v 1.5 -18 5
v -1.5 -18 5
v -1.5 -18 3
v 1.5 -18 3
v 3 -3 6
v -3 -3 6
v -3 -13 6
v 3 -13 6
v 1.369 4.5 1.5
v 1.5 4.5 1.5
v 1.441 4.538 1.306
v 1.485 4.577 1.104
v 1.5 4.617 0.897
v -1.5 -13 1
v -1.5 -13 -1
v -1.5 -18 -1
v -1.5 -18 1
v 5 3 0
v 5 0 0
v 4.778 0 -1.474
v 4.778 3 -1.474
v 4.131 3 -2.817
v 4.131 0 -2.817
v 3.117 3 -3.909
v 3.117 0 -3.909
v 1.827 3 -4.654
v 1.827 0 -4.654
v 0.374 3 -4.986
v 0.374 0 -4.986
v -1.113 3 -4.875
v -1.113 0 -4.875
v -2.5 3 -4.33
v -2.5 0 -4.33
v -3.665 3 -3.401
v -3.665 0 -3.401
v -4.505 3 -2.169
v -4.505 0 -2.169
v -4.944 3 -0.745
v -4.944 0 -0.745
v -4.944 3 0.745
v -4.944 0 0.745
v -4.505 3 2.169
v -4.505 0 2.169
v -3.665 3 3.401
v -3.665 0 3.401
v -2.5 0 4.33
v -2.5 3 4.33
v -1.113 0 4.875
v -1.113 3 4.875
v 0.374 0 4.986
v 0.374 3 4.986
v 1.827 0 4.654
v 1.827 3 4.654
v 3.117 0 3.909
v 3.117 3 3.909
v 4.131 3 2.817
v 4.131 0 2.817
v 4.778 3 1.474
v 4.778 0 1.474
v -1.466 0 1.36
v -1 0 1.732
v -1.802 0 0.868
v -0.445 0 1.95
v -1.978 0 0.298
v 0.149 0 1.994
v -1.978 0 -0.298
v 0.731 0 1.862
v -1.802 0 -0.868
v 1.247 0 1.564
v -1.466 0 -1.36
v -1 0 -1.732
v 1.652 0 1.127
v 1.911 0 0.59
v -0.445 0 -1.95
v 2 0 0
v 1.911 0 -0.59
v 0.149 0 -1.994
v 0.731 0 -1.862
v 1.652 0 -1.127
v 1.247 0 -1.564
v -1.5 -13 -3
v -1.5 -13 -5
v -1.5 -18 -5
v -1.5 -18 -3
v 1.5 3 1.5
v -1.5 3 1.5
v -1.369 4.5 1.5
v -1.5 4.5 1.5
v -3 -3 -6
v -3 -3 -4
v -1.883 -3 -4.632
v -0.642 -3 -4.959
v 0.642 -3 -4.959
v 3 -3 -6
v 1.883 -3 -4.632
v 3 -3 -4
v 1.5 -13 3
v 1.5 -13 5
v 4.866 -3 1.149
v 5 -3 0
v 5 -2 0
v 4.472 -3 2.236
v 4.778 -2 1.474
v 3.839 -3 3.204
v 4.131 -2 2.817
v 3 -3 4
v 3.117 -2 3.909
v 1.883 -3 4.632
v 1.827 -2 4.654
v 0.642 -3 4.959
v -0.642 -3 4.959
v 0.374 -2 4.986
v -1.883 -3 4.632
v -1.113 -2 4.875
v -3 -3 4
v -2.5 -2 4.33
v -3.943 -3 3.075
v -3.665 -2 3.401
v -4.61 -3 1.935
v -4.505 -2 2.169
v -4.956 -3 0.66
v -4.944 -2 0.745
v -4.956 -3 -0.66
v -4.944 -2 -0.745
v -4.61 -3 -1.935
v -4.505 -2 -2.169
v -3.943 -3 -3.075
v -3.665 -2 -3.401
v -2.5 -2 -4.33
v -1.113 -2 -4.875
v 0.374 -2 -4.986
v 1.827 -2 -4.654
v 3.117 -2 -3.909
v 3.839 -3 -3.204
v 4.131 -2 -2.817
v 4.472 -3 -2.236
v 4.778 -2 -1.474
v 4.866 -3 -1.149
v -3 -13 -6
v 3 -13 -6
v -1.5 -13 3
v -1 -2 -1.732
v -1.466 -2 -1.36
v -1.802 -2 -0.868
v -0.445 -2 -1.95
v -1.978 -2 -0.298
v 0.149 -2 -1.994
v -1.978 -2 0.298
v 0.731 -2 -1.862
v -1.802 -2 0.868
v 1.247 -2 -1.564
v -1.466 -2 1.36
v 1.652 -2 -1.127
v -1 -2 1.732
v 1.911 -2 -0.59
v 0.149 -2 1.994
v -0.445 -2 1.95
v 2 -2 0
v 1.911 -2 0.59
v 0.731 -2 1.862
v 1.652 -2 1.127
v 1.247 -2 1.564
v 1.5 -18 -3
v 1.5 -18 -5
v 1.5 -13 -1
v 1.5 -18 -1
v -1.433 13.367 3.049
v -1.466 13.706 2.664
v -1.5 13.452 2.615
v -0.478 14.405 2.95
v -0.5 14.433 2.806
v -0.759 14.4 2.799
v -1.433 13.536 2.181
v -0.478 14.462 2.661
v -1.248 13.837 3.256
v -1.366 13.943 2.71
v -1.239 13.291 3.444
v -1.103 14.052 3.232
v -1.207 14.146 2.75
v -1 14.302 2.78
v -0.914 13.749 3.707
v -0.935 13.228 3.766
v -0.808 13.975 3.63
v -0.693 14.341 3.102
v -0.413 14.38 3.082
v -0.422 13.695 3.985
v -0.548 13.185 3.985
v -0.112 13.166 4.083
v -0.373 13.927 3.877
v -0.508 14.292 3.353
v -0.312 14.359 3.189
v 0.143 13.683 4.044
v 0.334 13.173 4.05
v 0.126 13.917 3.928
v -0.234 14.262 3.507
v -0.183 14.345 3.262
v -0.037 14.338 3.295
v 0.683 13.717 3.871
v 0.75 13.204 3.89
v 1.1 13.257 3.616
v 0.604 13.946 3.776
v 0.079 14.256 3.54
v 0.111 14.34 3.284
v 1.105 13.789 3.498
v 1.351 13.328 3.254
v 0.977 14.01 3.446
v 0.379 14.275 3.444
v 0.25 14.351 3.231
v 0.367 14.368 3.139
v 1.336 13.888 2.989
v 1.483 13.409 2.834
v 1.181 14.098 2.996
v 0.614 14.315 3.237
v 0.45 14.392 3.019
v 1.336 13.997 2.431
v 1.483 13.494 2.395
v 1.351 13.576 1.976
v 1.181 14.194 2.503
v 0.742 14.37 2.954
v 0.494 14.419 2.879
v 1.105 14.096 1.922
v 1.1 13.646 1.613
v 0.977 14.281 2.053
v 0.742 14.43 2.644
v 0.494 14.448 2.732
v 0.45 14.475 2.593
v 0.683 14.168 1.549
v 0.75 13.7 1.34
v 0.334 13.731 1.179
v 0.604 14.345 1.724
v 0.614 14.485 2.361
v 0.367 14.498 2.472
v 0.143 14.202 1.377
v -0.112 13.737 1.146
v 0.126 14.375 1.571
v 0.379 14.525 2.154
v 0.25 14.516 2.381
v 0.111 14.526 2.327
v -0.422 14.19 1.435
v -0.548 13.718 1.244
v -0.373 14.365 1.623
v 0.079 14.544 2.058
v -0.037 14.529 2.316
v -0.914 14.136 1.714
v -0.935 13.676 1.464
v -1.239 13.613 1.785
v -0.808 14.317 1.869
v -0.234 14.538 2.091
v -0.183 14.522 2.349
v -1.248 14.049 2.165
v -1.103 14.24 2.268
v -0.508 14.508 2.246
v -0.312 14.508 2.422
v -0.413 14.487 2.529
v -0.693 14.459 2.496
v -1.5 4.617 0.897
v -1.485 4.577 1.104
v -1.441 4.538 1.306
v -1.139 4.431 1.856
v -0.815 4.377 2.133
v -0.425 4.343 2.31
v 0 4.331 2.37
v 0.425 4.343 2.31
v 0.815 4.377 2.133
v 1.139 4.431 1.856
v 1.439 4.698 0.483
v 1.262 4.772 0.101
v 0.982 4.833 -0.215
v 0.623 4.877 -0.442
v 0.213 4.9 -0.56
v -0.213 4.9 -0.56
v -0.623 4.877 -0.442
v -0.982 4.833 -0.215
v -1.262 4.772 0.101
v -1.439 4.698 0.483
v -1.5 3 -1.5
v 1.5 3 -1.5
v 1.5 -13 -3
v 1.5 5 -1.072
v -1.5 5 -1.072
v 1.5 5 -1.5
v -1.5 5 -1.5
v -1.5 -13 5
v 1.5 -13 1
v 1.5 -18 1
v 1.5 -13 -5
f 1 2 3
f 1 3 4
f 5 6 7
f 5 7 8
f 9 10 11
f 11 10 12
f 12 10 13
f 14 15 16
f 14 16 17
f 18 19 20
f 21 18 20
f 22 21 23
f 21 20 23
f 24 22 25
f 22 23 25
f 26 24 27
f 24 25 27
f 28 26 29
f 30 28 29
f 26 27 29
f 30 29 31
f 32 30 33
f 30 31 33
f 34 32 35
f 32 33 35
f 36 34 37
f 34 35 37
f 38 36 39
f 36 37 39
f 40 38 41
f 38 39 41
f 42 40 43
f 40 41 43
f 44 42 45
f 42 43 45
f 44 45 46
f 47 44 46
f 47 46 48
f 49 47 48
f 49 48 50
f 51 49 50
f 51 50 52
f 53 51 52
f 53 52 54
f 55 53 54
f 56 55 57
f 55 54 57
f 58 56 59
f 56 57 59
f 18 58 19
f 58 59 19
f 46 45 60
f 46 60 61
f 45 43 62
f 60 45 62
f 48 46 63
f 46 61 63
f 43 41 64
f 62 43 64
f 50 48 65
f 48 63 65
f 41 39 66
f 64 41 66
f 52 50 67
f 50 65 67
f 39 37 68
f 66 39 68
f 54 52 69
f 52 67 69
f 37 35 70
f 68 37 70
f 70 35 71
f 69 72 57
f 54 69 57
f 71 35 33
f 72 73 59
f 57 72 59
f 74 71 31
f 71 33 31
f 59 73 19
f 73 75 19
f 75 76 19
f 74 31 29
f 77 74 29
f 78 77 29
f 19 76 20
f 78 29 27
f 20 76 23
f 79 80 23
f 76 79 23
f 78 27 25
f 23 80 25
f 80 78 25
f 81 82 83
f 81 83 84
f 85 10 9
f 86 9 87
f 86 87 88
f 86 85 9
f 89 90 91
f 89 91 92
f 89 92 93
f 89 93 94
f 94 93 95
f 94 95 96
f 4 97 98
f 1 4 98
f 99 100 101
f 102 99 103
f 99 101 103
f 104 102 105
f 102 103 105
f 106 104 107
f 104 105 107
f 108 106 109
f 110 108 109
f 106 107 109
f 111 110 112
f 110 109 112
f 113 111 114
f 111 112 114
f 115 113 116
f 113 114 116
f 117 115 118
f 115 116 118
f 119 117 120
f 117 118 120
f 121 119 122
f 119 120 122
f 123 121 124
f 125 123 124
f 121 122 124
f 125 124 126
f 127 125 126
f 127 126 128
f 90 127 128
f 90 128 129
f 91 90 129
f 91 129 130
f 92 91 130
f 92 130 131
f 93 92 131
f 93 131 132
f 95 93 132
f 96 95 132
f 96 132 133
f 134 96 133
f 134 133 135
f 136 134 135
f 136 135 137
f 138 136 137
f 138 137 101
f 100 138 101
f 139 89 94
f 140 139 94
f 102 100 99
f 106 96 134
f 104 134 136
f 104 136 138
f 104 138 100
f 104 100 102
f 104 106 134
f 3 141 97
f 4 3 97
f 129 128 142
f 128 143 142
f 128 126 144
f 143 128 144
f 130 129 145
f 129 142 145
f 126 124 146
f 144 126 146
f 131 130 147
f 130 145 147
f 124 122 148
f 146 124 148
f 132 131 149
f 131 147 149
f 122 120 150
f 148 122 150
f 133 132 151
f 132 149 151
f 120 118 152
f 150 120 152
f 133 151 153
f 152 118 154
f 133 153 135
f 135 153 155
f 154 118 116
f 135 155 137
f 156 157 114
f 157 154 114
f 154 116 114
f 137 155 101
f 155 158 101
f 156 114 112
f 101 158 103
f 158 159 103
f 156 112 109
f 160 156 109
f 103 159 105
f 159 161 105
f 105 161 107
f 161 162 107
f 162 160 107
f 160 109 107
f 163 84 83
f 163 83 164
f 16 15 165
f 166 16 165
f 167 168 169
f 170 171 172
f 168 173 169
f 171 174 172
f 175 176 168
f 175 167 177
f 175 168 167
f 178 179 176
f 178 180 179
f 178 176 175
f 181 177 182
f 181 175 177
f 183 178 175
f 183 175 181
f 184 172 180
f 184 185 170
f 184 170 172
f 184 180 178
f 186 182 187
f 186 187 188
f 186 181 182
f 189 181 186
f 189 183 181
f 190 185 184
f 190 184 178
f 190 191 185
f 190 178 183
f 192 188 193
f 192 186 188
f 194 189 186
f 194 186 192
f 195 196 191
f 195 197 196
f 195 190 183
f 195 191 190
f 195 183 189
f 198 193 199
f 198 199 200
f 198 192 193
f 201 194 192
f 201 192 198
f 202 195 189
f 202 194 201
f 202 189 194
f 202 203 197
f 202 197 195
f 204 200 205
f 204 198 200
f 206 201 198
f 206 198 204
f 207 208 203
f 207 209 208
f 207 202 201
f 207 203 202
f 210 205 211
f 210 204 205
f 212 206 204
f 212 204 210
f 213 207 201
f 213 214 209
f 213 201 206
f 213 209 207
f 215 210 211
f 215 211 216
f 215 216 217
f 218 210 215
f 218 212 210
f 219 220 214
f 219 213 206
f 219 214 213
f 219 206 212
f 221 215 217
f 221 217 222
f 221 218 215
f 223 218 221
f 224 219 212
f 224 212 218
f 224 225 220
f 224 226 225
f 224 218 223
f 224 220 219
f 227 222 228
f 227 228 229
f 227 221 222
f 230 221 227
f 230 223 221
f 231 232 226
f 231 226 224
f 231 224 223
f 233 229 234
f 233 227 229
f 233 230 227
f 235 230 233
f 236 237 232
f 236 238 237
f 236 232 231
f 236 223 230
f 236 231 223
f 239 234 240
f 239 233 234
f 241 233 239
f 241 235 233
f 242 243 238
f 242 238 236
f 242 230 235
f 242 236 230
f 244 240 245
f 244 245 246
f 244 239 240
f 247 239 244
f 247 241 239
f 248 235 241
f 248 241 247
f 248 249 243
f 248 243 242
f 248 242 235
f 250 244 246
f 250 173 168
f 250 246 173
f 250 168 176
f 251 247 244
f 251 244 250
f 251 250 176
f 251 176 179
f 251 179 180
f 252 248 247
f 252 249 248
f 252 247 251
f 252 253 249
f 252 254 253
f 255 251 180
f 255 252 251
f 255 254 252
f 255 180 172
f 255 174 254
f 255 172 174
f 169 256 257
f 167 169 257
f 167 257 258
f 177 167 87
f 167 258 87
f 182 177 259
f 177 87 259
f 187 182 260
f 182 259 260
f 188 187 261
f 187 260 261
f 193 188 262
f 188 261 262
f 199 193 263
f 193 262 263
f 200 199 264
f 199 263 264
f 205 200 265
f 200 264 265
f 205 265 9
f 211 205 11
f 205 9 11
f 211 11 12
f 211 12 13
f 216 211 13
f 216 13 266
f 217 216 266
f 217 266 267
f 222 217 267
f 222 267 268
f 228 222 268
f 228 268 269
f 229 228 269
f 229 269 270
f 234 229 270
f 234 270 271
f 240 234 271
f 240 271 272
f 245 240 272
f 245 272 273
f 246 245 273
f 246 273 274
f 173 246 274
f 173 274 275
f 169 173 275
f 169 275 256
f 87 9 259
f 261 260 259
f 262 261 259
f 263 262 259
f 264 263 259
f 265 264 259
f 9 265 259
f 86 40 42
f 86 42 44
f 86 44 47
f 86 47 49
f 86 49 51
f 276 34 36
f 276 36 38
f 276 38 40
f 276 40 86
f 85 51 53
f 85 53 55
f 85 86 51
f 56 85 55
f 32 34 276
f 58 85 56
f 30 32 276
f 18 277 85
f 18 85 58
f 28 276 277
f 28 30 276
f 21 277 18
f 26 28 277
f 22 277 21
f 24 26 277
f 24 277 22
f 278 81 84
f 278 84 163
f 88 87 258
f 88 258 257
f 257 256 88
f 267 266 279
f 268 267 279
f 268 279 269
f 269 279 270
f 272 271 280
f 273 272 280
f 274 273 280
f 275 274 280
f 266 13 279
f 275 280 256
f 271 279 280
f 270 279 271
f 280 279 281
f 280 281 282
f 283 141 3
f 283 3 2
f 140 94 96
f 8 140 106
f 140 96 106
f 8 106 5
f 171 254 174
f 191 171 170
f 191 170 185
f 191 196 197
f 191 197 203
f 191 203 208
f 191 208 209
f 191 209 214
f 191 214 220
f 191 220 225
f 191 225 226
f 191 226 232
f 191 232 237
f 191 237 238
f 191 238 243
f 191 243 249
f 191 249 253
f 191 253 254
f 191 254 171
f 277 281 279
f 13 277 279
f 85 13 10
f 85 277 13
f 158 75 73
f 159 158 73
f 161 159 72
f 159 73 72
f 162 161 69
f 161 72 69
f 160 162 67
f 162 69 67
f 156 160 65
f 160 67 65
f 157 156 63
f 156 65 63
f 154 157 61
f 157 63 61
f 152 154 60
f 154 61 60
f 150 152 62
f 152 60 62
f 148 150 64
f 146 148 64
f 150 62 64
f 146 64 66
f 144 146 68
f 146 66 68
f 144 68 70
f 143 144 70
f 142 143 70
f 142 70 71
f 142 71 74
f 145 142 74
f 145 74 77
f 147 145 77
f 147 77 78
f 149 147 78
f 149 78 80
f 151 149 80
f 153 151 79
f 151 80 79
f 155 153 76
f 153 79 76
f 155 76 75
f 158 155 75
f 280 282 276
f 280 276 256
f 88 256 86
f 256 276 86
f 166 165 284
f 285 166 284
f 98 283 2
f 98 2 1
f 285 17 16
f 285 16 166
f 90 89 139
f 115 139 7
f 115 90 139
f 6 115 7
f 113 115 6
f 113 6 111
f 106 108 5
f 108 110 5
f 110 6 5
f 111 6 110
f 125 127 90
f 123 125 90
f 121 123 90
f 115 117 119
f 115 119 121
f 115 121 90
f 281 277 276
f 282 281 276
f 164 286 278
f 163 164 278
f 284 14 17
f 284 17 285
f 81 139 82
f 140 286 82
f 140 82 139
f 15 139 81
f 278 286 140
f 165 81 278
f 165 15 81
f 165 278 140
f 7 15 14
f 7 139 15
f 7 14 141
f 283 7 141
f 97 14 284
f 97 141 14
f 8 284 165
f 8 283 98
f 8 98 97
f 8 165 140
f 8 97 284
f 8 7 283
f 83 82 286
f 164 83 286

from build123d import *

# Parameters (mm, degrees)
ESQUISSE1_R      = 5
EXTRUSION1_DEPTH = 3
ESQUISSE3_R      = 2
EXTRUSION3_DEPTH = 2
ESQUISSE4_R      = 5
EXTRUSION4_DEPTH = 1
ESQUISSE5_W      = 6
ESQUISSE5_H      = 12
EXTRUSION5_DEPTH = 10
ESQUISSE6_W      = 3
ESQUISSE6_H      = 2
EXTRUSION6_DEPTH = 5
ESQUISSE8_W      = 3
ESQUISSE8_H      = 3
EXTRUSION8_DEPTH = 2
CHANFREIN1_SIZE  = 0.5
CHANFREIN1_SIZE2 = 2.572277008
ESQUISSE9_R      = 1.5
EXTRUSION9_DEPTH = 10
CONG_1_R         = 1


with BuildPart() as part:
    # Esquisse1 → Extrusion1 (new body)
    with BuildSketch(Plane(origin=(0, 0, 0), x_dir=(1, 0, 0), z_dir=(0, 1, 0))):
        Circle(ESQUISSE1_R)
    extrude(amount=EXTRUSION1_DEPTH)

    # Esquisse3 → Extrusion3 (add)
    with BuildSketch(Plane.XZ):
        Circle(ESQUISSE3_R)
    extrude(amount=EXTRUSION3_DEPTH)

    # Esquisse4 → Extrusion4 (add)
    with BuildSketch(Plane.XZ.offset(2)):
        Circle(ESQUISSE4_R)
    extrude(amount=EXTRUSION4_DEPTH)

    # Esquisse5 → Extrusion5 (add)
    with BuildSketch(Plane.XZ.offset(3)):
        Rectangle(ESQUISSE5_W, ESQUISSE5_H)
    extrude(amount=EXTRUSION5_DEPTH)

    # Esquisse6 → Extrusion6 (add)
    with BuildSketch(Plane.XZ.offset(13)):
        with Locations((0, 4)):
            Rectangle(ESQUISSE6_W, ESQUISSE6_H)
        Rectangle(ESQUISSE6_W, ESQUISSE6_H)
        with Locations((0, -4)):
            Rectangle(ESQUISSE6_W, ESQUISSE6_H)
    extrude(amount=EXTRUSION6_DEPTH)

    # Esquisse8 → Extrusion8 (add)
    with BuildSketch(Plane(origin=(0, 3, 0), x_dir=(-1, 0, 0), z_dir=(0, 1, 0))):
        Rectangle(ESQUISSE8_W, ESQUISSE8_H)
    extrude(amount=EXTRUSION8_DEPTH)

    # Chanfrein1
    chanfrein1_edges = [part.edges().sort_by_distance(p)[0] for p in [
        (0, 5, 1.5),
    ]]
    chanfrein1_side = [part.faces().sort_by_distance(p)[0] for p in [
        (0, 4, 1.5),
    ]]
    chamfer(chanfrein1_edges, length=CHANFREIN1_SIZE, length2=CHANFREIN1_SIZE2, reference=chanfrein1_side[0])

    # Esquisse9 → Extrusion9 (add)
    with BuildSketch(Plane(origin=(0, 4.617118618, 0.897476944), x_dir=(-1, 0, 0), z_dir=(0, 0.981627183, 0.190808995))):
        Circle(ESQUISSE9_R)
    extrude(amount=EXTRUSION9_DEPTH)

    # Congé1
    cong_1_edges = [part.edges().sort_by_distance(p)[0] for p in [
        (1.5, 14.433390452, 2.805566898),
    ]]
    fillet(cong_1_edges, radius=CONG_1_R)


solid = part.part
